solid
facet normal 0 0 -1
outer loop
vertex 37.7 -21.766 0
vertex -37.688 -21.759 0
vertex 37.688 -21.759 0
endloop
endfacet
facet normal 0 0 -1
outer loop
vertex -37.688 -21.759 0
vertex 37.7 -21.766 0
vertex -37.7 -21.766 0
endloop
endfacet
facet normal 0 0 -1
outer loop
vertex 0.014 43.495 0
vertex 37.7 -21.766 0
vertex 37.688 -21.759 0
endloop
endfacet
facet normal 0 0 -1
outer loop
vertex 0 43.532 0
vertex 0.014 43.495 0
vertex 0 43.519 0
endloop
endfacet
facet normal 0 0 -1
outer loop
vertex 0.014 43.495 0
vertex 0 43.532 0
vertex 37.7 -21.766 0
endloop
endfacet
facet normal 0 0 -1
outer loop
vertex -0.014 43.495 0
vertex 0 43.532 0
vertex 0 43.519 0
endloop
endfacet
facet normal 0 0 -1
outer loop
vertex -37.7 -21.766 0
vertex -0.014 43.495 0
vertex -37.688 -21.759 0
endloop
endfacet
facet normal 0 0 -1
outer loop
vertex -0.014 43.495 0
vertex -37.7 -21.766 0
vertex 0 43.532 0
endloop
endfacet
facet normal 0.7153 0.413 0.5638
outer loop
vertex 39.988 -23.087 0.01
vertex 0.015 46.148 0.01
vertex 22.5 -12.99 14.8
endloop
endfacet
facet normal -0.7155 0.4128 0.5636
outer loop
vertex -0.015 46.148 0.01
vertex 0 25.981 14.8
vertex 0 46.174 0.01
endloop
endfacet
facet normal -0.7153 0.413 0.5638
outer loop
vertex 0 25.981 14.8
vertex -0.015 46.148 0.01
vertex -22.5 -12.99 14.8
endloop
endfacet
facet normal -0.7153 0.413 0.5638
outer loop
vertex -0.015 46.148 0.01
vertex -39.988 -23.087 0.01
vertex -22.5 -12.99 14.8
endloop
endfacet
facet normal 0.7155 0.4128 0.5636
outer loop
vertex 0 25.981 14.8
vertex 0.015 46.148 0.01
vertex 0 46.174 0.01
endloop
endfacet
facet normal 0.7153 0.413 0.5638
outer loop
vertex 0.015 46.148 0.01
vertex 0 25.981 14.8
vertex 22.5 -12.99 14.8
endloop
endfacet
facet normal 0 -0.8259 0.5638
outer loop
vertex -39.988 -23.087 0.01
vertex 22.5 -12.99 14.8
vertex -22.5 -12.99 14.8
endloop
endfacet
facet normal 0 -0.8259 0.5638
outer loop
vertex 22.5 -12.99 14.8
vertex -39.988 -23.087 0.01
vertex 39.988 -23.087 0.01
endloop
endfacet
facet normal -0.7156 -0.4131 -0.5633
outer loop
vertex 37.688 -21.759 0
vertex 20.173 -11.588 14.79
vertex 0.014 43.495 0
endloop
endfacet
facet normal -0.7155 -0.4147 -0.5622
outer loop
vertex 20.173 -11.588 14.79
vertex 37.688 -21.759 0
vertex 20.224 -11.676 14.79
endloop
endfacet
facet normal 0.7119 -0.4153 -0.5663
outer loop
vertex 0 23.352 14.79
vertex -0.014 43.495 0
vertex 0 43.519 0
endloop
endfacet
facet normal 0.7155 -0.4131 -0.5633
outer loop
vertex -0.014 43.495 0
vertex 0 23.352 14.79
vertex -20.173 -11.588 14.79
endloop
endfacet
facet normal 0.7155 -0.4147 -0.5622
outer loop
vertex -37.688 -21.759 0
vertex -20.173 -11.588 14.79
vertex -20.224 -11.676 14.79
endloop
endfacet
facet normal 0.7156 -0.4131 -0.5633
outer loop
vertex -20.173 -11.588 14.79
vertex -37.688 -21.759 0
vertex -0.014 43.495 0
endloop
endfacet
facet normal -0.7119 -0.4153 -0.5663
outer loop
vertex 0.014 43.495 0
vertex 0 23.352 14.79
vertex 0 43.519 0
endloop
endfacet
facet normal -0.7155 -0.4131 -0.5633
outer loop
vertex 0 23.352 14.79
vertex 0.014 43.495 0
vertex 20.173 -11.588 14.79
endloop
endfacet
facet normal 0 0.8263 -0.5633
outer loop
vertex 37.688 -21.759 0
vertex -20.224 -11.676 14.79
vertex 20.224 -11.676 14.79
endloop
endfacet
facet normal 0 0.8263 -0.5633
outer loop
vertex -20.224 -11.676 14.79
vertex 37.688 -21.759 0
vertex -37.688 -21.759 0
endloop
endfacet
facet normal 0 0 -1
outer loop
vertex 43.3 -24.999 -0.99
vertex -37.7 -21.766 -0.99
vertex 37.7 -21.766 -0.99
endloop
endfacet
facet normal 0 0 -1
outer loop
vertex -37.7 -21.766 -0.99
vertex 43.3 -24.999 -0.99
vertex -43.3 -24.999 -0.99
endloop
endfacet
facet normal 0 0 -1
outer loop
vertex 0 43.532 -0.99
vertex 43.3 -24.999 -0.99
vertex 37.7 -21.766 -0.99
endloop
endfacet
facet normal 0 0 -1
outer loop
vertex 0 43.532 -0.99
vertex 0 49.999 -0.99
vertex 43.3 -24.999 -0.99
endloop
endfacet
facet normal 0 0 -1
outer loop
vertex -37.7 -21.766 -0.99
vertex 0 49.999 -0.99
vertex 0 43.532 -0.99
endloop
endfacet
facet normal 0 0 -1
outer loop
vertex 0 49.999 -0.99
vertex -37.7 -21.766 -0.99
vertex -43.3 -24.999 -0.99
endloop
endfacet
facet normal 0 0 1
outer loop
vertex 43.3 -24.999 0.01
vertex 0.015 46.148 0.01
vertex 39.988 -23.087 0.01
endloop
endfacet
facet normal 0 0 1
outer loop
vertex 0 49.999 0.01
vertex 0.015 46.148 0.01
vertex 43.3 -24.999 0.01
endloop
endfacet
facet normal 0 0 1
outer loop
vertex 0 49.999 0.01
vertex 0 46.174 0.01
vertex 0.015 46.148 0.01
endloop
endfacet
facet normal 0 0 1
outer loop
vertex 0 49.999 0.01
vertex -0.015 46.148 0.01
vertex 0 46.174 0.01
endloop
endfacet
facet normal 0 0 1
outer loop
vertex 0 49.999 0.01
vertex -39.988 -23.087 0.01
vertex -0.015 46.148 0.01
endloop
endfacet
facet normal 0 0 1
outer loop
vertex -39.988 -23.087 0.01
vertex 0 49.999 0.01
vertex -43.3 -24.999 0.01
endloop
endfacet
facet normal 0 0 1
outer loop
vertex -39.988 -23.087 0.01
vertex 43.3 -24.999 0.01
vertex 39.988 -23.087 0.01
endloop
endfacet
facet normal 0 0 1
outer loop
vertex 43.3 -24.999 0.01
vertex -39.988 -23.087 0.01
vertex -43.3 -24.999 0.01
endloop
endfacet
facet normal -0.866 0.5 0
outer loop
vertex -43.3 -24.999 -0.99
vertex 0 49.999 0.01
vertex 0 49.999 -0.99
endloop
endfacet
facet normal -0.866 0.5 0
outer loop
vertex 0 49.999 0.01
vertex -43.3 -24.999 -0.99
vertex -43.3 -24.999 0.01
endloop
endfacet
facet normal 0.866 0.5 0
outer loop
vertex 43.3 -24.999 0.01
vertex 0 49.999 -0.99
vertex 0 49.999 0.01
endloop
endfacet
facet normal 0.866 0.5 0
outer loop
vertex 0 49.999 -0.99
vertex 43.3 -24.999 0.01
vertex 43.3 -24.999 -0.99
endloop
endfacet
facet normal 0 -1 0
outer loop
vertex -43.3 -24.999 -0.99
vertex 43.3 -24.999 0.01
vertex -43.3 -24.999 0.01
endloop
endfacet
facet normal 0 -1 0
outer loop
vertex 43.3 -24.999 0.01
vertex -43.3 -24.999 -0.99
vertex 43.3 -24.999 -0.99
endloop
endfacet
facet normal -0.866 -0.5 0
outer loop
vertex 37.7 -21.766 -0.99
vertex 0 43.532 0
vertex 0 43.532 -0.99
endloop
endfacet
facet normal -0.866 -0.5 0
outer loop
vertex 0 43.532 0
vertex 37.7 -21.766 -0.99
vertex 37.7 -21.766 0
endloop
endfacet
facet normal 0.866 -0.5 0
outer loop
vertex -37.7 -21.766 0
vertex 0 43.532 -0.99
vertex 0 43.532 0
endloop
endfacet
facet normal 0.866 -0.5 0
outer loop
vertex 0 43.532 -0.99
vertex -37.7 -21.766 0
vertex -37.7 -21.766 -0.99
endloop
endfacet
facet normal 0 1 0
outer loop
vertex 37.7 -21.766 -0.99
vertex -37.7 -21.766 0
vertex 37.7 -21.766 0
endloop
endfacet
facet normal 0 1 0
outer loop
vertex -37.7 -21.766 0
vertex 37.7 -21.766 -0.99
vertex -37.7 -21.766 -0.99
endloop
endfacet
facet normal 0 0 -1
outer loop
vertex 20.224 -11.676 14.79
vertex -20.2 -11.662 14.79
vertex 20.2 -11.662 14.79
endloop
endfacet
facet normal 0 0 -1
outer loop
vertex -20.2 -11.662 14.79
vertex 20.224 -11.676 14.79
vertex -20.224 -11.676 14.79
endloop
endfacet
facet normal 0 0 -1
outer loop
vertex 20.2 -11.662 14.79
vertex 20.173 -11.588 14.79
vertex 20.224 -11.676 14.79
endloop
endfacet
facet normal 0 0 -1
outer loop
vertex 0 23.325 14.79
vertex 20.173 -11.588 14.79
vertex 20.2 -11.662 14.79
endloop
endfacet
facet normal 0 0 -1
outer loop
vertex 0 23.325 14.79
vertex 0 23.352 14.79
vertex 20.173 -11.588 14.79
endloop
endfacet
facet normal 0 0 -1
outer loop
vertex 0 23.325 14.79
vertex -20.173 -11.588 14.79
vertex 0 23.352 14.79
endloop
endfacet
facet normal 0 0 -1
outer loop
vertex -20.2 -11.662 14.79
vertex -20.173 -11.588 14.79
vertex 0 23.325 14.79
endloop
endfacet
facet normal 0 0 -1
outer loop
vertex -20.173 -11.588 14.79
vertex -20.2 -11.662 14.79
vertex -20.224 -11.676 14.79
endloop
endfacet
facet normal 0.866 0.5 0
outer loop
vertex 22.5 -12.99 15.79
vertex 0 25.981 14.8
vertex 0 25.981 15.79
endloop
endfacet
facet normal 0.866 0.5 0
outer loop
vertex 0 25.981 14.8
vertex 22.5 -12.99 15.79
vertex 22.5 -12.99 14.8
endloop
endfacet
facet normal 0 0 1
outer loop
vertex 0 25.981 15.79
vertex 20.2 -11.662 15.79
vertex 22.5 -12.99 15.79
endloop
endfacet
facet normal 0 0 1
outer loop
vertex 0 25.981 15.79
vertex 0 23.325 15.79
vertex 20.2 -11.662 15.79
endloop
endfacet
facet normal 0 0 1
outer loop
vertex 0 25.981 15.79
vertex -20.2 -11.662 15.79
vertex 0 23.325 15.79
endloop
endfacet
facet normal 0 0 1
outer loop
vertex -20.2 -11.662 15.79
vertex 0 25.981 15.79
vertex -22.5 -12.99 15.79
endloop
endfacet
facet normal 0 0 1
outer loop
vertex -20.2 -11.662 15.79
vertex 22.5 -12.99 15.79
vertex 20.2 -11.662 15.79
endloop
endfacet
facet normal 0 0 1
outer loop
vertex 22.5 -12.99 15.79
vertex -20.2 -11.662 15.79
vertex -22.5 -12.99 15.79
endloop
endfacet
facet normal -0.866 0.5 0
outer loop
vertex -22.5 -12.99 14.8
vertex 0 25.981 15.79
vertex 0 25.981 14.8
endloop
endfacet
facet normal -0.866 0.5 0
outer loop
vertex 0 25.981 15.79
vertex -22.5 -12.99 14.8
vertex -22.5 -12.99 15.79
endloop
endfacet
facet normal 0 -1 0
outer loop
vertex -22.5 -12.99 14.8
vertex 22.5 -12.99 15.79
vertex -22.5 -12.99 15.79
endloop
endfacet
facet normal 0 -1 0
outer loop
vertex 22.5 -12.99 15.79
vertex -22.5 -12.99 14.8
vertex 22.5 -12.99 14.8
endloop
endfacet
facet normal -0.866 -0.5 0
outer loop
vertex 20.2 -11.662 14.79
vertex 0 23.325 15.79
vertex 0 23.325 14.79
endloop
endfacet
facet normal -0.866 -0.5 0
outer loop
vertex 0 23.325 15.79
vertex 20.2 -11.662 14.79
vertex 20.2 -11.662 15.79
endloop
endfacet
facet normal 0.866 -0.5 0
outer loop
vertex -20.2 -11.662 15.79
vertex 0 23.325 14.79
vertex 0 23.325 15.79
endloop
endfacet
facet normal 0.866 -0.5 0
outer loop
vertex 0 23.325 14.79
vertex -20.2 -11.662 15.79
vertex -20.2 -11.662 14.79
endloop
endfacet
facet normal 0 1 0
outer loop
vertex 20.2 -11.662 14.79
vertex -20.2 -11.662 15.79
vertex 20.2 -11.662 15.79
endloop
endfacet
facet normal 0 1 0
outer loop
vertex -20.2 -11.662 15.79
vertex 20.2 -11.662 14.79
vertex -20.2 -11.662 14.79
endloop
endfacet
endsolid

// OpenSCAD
/*
*******************************************
Objekt Info: Ständer für den Zauberwürfel

*******************************************
Version: 08.08.2022 khf
*******************************************
*/           

//***************   Auswahl   *************

//keine              

//*****************************************

//***************   Libraries  ************

//keine  

//*****************************************

//***************  Parmeter   *************

TL = 45;		// Obere Seitenlänge
BL = 80;		// Untere Seitenlänge
H = 14.8;	// Höhe
TH = 2.3;	// Dicke
LH = 1;		// Höhe der oberen Lippe
BH = 1;		// Tiefe der Sockelhöhe
BTH = 3.3;	// Bodentiefe 
F = 0.01;	// Fudge-Faktor zum Kombinieren von Objekten

//*****************************************

//**************   Programm  **************


module pyramid(l, l2, h)
{
	c = l / (2 * cos(30));
	b = l / 2;
	a = (l * sin(60)) - c;
	c2 = l2 / (2 * cos(30));
	b2 = l2 / 2;
	a2 = (l2 * sin(60)) - c2;
	polyhedron(	points=[ [0,c,0],[-b,-a,0],[b,-a,0],[0,c2,h],[-b2,-a2,h],[b2,-a2,h] ],
				triangles=[ [0,1,2],[1,0,3],[4,1,3],[0,2,5],[3,0,5],[2,1,4],[4,5,2],[5,4,3] ]);
}

union()
{
	// Build the main body.
	difference()
	{
		pyramid(BL, TL, H);
		translate(v = [0, 0, -F])
			pyramid(BL - (TH * 2), TL - (TH * 2), H + (F * 2));
	}

	// Build the bottom base.
	translate(v = [0, 0, F - BH])
	{
		difference()
		{
			pyramid(BL + (BTH * 2), BL + (BTH * 2), BH);
			translate(v = [0, 0, -F])
				pyramid(BL - (TH * 2), BL - (TH * 2), BH + (F * 2));
		}
	}

	// Build the top lip.
	translate(v = [0, 0, H - F])
	{
		difference()
		{
			pyramid(TL, TL, LH);
			translate(v = [0, 0, -F])
				pyramid(TL - (TH * 2), TL - (TH * 2), LH + (F * 2));
		}
	}
}
